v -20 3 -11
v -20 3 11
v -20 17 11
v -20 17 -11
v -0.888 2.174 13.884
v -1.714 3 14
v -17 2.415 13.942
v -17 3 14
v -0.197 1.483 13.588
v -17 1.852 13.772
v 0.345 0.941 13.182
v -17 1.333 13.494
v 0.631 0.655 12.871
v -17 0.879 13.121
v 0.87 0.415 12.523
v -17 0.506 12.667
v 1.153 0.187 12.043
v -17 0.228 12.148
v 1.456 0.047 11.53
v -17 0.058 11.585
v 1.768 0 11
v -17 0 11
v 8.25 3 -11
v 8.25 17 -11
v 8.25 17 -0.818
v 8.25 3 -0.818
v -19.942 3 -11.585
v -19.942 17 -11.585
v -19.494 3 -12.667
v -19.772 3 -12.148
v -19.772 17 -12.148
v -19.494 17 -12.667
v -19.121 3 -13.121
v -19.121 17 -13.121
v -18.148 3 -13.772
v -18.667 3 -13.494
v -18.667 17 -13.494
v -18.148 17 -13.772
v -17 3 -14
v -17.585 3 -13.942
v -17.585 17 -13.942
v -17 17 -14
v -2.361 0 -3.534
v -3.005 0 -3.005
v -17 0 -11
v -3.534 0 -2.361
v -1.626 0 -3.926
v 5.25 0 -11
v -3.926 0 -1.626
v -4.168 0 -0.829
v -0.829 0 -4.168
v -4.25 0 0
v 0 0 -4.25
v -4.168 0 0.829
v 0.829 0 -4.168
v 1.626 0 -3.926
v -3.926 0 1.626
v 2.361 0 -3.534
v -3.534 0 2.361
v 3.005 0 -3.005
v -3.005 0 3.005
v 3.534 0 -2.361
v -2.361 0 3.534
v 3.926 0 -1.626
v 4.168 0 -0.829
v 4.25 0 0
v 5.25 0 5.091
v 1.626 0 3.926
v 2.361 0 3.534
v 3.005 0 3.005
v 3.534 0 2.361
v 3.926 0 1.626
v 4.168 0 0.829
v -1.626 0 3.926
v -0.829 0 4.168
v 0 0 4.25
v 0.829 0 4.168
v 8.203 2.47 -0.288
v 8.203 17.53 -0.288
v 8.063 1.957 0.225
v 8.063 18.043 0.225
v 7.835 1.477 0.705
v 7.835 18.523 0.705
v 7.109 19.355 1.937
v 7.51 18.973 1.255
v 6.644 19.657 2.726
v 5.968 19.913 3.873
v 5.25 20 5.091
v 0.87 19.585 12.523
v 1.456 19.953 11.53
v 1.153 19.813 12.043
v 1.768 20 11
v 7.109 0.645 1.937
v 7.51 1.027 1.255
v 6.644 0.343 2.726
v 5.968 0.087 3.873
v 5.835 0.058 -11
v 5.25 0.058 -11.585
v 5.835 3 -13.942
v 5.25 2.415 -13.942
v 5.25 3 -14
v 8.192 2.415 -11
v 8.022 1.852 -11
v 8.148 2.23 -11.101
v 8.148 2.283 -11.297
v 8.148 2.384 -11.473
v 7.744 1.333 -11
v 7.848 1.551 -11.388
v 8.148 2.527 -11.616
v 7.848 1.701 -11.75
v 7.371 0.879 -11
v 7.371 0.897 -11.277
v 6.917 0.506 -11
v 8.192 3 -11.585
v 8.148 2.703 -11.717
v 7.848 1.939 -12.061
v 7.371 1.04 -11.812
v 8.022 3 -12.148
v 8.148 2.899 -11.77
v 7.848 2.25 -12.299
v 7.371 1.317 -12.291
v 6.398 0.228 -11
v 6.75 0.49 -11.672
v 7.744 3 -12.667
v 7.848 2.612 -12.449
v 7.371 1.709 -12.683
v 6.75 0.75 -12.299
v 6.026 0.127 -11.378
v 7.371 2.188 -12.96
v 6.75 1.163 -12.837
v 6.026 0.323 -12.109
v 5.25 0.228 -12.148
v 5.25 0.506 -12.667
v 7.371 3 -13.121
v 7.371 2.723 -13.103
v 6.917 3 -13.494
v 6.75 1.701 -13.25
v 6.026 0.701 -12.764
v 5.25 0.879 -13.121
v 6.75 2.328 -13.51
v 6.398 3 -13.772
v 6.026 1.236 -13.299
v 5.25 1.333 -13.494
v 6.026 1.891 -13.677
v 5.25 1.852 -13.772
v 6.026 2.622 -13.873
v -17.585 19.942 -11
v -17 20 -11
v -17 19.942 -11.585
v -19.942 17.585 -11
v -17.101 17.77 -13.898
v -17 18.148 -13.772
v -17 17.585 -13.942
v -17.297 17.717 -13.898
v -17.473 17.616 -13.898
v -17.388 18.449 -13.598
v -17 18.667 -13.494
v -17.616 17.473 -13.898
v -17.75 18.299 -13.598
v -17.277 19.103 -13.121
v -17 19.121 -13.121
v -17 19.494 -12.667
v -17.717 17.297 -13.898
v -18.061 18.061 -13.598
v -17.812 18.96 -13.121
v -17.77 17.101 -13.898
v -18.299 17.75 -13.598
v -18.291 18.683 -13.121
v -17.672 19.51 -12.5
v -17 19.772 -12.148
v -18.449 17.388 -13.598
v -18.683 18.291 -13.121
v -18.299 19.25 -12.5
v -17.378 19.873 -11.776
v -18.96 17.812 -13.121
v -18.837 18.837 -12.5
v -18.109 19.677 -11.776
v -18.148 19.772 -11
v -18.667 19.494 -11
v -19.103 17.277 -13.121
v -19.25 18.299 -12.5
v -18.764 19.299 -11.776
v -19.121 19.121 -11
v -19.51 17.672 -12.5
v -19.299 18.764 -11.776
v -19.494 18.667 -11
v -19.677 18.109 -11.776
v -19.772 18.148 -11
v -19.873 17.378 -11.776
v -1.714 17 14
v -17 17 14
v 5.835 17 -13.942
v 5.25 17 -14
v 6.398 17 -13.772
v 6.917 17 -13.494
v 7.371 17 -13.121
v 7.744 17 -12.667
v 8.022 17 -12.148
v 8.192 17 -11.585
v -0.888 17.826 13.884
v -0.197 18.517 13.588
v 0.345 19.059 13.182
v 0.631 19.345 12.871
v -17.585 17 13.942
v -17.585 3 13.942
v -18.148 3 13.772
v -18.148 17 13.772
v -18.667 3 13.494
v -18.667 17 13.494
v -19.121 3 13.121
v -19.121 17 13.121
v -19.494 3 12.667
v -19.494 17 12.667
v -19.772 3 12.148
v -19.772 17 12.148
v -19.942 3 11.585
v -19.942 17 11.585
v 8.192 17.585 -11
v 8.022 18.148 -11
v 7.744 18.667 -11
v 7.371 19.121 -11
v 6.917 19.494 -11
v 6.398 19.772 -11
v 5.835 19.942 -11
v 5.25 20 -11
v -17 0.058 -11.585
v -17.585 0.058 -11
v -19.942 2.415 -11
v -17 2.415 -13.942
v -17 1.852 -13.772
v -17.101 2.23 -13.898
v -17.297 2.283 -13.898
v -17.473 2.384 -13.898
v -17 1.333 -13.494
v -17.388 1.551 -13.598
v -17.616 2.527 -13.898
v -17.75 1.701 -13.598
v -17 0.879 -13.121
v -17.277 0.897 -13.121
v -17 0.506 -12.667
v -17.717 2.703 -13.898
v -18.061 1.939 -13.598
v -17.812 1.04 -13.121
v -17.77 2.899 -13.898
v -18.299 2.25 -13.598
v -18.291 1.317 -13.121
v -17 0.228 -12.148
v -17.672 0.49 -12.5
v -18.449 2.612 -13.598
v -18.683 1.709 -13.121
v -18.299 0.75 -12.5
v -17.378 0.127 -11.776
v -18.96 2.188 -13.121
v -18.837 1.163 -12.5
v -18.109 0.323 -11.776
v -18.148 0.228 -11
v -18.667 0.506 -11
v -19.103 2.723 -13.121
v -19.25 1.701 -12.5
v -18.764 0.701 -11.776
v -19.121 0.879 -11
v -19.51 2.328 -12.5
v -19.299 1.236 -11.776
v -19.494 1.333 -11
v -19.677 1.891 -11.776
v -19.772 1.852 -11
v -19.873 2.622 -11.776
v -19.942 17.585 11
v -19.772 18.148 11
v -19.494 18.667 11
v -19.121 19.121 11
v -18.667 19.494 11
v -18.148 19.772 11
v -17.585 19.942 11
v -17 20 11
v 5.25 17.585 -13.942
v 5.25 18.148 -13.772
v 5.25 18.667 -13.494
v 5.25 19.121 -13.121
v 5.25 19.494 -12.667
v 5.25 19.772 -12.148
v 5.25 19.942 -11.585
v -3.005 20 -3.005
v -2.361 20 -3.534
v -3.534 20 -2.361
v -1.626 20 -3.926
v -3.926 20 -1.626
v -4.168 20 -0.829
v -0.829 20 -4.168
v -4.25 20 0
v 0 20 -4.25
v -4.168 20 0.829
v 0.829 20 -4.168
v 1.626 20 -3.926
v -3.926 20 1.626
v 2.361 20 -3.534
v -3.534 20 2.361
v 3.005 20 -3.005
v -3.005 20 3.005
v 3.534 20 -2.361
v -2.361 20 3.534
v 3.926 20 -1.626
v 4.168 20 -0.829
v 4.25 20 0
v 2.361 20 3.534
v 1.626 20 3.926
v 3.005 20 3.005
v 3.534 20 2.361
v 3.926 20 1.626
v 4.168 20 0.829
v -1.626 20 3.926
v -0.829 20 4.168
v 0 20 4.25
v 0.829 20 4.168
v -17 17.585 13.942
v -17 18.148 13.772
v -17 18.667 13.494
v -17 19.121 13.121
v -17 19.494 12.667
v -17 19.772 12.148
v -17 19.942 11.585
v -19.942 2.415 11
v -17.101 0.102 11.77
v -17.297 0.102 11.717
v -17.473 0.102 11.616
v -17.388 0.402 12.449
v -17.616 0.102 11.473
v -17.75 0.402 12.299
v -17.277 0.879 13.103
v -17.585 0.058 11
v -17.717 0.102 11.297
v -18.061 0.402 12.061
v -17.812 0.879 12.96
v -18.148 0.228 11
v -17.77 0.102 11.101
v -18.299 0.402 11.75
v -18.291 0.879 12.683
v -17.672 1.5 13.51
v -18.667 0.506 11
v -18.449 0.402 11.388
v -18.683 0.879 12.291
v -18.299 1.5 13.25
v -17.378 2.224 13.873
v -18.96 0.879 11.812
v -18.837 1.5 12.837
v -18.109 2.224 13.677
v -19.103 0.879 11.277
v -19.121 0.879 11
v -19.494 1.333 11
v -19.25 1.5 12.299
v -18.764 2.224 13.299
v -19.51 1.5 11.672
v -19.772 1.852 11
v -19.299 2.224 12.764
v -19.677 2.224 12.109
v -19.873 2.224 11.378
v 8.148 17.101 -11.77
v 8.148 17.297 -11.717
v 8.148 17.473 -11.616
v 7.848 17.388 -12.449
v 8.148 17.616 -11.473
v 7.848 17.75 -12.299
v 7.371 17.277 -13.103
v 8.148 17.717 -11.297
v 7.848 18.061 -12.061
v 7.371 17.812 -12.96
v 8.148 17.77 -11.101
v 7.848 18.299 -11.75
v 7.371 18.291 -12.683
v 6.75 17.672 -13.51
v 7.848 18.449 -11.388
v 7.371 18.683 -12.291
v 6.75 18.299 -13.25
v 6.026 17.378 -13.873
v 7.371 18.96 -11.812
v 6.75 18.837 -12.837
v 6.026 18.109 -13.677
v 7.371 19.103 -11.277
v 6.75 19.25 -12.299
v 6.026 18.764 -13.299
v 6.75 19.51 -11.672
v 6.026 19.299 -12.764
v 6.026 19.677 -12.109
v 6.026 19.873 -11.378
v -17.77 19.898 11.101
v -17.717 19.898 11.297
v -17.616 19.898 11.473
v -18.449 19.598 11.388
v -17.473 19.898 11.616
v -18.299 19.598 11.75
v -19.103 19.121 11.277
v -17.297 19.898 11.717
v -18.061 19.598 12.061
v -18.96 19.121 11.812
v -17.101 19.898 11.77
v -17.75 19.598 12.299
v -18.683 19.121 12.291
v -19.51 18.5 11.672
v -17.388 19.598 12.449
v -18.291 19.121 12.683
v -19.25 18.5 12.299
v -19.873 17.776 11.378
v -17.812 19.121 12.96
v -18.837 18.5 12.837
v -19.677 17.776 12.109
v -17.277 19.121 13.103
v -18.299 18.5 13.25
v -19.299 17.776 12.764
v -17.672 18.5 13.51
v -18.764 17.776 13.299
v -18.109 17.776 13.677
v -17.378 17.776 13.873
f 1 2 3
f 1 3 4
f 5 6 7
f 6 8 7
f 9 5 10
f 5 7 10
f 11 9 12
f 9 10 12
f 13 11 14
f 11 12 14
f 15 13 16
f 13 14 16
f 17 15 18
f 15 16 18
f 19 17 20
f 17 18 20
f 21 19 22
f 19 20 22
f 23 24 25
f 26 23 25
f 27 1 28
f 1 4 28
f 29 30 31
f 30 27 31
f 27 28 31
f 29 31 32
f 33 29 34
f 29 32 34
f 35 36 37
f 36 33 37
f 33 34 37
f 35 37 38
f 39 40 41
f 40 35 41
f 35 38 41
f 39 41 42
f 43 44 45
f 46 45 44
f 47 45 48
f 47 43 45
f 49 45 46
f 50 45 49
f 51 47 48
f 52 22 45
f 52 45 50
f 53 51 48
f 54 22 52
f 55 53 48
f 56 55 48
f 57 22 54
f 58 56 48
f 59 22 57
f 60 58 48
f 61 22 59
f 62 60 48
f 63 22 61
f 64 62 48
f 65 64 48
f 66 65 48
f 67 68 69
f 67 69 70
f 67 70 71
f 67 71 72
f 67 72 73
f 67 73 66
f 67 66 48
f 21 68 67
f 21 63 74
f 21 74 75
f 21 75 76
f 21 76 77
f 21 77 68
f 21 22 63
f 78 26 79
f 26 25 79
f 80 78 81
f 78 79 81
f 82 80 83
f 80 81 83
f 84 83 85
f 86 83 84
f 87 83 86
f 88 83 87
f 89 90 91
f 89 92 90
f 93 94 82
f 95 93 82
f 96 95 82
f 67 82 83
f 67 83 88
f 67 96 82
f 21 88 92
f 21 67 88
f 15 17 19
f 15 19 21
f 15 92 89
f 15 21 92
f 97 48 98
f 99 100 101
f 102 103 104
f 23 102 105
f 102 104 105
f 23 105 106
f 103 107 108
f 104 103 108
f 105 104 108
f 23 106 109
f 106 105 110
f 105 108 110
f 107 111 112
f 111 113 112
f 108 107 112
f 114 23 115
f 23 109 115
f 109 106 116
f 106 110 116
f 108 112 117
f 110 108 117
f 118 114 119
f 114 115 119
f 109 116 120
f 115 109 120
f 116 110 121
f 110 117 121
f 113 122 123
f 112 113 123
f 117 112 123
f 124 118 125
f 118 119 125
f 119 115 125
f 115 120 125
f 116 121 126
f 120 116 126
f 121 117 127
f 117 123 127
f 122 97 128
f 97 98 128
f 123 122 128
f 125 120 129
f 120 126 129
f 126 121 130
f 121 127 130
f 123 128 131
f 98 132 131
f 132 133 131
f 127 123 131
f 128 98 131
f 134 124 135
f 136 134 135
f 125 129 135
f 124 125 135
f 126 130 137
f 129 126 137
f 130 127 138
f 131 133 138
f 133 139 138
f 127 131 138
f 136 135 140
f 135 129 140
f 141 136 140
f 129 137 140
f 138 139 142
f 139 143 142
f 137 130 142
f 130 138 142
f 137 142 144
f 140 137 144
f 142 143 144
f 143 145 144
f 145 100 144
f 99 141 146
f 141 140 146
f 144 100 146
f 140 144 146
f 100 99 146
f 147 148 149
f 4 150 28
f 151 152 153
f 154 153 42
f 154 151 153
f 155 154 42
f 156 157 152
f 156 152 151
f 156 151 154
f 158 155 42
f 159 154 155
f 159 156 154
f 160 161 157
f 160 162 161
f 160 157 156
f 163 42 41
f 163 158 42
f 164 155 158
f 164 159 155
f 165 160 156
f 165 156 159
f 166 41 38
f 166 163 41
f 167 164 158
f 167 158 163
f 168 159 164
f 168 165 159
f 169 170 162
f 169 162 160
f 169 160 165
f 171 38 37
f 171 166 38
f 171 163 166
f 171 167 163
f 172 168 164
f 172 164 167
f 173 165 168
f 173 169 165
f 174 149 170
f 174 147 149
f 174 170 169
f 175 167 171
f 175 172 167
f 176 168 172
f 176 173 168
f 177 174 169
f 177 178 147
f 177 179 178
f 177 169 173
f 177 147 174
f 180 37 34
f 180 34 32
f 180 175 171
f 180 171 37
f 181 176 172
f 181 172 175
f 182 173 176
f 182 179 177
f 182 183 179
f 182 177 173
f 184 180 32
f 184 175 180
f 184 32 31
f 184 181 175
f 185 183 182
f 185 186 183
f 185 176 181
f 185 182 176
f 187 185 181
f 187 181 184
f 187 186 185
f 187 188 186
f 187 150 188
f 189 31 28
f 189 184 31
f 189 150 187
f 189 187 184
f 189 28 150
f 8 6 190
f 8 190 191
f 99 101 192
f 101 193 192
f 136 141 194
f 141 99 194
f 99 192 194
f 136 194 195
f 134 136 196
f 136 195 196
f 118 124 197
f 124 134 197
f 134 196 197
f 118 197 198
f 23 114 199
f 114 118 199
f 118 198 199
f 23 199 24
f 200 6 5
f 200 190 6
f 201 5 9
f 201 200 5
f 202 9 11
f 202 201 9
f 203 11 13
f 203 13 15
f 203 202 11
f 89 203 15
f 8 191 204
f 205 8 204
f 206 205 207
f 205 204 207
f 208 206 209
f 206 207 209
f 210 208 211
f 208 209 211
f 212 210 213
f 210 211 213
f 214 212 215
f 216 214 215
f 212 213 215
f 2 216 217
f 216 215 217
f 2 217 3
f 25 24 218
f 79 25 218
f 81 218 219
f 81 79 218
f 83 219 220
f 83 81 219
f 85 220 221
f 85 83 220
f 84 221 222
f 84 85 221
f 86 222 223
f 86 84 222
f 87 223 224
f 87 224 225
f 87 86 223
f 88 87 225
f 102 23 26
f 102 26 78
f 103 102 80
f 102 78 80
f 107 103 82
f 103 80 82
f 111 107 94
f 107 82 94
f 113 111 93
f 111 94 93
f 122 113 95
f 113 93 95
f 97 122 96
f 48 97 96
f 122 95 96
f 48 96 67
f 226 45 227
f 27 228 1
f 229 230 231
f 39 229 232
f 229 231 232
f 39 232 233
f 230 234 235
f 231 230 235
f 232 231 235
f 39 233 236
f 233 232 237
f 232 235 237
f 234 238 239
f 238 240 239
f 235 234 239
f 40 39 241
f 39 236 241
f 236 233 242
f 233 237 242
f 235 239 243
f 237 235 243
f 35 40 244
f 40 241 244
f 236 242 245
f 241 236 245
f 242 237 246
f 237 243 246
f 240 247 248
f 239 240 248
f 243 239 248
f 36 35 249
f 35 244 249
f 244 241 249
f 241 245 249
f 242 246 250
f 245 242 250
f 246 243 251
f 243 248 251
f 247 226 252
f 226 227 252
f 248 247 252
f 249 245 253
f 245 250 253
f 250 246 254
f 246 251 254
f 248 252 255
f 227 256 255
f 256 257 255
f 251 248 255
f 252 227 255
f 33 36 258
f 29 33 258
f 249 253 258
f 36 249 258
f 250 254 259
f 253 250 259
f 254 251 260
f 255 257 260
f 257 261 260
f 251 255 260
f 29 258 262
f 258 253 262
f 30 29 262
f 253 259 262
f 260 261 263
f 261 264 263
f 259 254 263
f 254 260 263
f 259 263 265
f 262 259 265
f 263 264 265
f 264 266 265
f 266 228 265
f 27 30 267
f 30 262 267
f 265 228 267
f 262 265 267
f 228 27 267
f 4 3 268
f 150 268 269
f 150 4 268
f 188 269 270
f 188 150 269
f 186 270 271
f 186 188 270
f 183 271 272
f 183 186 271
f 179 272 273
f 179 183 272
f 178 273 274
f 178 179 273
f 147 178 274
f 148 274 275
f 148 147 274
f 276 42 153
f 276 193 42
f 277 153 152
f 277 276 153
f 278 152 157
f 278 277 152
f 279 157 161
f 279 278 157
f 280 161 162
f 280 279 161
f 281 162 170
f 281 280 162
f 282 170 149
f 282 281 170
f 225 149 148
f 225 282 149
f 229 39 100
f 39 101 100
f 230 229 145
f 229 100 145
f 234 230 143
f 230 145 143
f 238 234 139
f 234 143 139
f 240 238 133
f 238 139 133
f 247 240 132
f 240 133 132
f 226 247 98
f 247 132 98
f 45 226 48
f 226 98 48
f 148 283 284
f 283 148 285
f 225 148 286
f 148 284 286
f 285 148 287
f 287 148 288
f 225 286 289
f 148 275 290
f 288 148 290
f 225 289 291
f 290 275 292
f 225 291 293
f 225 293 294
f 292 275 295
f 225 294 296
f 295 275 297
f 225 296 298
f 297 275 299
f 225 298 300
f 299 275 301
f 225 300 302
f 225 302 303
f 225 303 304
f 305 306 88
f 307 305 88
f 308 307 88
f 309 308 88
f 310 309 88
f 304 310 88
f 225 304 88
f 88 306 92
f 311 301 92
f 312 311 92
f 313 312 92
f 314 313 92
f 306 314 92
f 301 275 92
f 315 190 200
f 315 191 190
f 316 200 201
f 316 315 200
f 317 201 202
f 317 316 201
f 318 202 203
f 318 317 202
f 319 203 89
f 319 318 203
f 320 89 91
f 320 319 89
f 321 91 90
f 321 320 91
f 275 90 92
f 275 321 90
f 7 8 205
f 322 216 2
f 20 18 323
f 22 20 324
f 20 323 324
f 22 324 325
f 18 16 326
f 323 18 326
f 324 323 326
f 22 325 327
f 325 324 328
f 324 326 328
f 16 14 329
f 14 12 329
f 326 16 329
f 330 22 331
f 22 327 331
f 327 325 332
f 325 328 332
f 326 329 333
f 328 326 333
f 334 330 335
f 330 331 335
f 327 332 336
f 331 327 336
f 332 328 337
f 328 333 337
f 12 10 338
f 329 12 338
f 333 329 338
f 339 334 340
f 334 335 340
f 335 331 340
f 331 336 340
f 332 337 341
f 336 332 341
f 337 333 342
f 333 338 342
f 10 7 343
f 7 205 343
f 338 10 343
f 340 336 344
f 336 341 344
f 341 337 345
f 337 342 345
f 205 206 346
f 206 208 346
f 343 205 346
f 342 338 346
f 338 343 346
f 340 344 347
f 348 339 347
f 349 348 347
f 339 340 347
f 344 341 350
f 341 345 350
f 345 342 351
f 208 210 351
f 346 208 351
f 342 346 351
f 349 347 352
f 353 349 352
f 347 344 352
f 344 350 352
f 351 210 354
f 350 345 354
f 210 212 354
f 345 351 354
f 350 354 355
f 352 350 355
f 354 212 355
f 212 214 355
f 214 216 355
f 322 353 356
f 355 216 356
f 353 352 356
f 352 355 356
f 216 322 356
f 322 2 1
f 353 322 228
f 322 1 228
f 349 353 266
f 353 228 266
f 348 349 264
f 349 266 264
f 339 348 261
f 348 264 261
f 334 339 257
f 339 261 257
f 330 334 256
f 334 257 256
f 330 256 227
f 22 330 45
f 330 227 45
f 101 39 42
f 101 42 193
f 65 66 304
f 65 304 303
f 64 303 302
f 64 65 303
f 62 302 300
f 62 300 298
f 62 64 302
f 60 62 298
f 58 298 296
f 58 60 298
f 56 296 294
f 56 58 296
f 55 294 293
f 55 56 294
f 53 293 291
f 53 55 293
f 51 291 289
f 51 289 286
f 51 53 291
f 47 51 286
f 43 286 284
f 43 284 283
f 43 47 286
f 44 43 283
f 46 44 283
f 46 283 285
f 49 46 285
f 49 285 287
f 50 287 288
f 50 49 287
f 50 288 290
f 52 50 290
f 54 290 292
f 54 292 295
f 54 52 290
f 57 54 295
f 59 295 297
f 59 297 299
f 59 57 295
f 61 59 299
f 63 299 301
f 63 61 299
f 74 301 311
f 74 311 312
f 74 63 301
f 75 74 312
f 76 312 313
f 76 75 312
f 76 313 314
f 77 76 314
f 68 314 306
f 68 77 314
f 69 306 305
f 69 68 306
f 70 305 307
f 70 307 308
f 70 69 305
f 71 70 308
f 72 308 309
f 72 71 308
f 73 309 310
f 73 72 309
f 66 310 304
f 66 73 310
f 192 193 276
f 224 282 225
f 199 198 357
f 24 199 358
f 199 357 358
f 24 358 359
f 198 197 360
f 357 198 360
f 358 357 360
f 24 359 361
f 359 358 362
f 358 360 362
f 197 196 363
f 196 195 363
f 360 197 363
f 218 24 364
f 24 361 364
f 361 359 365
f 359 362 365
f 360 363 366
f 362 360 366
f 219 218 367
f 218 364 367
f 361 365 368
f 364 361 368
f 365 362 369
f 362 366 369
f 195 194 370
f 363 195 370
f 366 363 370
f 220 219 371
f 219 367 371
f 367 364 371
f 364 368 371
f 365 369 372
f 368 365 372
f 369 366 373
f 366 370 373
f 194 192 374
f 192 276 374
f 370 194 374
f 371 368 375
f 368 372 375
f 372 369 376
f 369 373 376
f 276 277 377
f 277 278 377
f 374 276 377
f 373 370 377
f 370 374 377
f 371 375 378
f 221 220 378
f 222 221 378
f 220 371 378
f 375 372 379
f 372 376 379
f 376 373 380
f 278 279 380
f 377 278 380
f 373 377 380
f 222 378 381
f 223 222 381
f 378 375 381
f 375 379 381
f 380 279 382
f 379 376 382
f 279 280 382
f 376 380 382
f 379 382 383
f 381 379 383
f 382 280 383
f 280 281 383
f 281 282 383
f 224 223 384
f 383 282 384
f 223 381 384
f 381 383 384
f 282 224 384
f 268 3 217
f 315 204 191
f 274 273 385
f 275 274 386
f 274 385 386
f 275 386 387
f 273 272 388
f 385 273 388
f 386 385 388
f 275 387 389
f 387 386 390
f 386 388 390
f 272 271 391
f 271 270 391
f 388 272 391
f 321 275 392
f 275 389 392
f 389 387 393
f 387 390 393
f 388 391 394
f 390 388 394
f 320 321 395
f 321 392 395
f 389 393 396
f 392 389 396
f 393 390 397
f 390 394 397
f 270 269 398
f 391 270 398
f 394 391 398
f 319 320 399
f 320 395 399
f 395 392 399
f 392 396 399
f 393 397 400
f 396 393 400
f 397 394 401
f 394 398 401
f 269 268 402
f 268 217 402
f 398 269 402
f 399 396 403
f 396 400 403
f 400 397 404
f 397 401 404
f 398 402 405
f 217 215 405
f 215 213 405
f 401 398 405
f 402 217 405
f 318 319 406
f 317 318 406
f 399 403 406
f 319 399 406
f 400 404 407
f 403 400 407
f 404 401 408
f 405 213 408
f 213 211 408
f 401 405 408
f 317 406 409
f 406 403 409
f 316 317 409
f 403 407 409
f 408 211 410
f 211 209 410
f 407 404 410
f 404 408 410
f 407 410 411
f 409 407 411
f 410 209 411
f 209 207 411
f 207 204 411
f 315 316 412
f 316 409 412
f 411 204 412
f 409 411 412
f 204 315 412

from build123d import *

# Parameters (mm, degrees)
F1_DEPTH = 20
F2_R     = 3


with BuildPart() as f1:
    # F0 (on Front) → F1 (new body)
    with BuildSketch(Plane.XZ):
        with BuildLine():
            Line((8.25, 0), (4.25, 0))
            ThreePointArc((4.25, 0), (-3.00520382, -3.00520382), (0, 4.25))
            Line((0, 4.25), (0, 14))
            Line((0, 14), (-20, 14))
            Line((-20, 14), (-20, 0))
            Line((-20, 0), (-20, -14))
            Line((-20, -14), (0, -14))
            Line((0, -14), (8.25, -14))
            Line((8.25, -14), (8.25, 0))
        make_face()
        with BuildLine():
            ThreePointArc((0, 4.25), (3.00520382, 3.00520382), (4.25, 0))
            Line((4.25, 0), (8.25, 0))
            Line((8.25, 0), (0, 14))
            Line((0, 14), (0, 4.25))
        make_face()
    extrude(amount=-F1_DEPTH)

    # F2
    f2_edges = [f1.edges().sort_by_distance(p)[0] for p in [
        (0, 10, 14),
        (8.25, 10, 0),
        (-20, 10, 14),
        (-20, 20, 0),
        (-10, 0, 14),
        (-20, 0, 0),
        (-5.875, 0, -14),
        (8.25, 0, -7),
        (-10, 20, 14),
        (-5.875, 20, -14),
        (8.25, 10, -14),
        (8.25, 20, -7),
        (-20, 10, -14),
    ]]
    fillet(f2_edges, radius=F2_R)


solid = f1.part
